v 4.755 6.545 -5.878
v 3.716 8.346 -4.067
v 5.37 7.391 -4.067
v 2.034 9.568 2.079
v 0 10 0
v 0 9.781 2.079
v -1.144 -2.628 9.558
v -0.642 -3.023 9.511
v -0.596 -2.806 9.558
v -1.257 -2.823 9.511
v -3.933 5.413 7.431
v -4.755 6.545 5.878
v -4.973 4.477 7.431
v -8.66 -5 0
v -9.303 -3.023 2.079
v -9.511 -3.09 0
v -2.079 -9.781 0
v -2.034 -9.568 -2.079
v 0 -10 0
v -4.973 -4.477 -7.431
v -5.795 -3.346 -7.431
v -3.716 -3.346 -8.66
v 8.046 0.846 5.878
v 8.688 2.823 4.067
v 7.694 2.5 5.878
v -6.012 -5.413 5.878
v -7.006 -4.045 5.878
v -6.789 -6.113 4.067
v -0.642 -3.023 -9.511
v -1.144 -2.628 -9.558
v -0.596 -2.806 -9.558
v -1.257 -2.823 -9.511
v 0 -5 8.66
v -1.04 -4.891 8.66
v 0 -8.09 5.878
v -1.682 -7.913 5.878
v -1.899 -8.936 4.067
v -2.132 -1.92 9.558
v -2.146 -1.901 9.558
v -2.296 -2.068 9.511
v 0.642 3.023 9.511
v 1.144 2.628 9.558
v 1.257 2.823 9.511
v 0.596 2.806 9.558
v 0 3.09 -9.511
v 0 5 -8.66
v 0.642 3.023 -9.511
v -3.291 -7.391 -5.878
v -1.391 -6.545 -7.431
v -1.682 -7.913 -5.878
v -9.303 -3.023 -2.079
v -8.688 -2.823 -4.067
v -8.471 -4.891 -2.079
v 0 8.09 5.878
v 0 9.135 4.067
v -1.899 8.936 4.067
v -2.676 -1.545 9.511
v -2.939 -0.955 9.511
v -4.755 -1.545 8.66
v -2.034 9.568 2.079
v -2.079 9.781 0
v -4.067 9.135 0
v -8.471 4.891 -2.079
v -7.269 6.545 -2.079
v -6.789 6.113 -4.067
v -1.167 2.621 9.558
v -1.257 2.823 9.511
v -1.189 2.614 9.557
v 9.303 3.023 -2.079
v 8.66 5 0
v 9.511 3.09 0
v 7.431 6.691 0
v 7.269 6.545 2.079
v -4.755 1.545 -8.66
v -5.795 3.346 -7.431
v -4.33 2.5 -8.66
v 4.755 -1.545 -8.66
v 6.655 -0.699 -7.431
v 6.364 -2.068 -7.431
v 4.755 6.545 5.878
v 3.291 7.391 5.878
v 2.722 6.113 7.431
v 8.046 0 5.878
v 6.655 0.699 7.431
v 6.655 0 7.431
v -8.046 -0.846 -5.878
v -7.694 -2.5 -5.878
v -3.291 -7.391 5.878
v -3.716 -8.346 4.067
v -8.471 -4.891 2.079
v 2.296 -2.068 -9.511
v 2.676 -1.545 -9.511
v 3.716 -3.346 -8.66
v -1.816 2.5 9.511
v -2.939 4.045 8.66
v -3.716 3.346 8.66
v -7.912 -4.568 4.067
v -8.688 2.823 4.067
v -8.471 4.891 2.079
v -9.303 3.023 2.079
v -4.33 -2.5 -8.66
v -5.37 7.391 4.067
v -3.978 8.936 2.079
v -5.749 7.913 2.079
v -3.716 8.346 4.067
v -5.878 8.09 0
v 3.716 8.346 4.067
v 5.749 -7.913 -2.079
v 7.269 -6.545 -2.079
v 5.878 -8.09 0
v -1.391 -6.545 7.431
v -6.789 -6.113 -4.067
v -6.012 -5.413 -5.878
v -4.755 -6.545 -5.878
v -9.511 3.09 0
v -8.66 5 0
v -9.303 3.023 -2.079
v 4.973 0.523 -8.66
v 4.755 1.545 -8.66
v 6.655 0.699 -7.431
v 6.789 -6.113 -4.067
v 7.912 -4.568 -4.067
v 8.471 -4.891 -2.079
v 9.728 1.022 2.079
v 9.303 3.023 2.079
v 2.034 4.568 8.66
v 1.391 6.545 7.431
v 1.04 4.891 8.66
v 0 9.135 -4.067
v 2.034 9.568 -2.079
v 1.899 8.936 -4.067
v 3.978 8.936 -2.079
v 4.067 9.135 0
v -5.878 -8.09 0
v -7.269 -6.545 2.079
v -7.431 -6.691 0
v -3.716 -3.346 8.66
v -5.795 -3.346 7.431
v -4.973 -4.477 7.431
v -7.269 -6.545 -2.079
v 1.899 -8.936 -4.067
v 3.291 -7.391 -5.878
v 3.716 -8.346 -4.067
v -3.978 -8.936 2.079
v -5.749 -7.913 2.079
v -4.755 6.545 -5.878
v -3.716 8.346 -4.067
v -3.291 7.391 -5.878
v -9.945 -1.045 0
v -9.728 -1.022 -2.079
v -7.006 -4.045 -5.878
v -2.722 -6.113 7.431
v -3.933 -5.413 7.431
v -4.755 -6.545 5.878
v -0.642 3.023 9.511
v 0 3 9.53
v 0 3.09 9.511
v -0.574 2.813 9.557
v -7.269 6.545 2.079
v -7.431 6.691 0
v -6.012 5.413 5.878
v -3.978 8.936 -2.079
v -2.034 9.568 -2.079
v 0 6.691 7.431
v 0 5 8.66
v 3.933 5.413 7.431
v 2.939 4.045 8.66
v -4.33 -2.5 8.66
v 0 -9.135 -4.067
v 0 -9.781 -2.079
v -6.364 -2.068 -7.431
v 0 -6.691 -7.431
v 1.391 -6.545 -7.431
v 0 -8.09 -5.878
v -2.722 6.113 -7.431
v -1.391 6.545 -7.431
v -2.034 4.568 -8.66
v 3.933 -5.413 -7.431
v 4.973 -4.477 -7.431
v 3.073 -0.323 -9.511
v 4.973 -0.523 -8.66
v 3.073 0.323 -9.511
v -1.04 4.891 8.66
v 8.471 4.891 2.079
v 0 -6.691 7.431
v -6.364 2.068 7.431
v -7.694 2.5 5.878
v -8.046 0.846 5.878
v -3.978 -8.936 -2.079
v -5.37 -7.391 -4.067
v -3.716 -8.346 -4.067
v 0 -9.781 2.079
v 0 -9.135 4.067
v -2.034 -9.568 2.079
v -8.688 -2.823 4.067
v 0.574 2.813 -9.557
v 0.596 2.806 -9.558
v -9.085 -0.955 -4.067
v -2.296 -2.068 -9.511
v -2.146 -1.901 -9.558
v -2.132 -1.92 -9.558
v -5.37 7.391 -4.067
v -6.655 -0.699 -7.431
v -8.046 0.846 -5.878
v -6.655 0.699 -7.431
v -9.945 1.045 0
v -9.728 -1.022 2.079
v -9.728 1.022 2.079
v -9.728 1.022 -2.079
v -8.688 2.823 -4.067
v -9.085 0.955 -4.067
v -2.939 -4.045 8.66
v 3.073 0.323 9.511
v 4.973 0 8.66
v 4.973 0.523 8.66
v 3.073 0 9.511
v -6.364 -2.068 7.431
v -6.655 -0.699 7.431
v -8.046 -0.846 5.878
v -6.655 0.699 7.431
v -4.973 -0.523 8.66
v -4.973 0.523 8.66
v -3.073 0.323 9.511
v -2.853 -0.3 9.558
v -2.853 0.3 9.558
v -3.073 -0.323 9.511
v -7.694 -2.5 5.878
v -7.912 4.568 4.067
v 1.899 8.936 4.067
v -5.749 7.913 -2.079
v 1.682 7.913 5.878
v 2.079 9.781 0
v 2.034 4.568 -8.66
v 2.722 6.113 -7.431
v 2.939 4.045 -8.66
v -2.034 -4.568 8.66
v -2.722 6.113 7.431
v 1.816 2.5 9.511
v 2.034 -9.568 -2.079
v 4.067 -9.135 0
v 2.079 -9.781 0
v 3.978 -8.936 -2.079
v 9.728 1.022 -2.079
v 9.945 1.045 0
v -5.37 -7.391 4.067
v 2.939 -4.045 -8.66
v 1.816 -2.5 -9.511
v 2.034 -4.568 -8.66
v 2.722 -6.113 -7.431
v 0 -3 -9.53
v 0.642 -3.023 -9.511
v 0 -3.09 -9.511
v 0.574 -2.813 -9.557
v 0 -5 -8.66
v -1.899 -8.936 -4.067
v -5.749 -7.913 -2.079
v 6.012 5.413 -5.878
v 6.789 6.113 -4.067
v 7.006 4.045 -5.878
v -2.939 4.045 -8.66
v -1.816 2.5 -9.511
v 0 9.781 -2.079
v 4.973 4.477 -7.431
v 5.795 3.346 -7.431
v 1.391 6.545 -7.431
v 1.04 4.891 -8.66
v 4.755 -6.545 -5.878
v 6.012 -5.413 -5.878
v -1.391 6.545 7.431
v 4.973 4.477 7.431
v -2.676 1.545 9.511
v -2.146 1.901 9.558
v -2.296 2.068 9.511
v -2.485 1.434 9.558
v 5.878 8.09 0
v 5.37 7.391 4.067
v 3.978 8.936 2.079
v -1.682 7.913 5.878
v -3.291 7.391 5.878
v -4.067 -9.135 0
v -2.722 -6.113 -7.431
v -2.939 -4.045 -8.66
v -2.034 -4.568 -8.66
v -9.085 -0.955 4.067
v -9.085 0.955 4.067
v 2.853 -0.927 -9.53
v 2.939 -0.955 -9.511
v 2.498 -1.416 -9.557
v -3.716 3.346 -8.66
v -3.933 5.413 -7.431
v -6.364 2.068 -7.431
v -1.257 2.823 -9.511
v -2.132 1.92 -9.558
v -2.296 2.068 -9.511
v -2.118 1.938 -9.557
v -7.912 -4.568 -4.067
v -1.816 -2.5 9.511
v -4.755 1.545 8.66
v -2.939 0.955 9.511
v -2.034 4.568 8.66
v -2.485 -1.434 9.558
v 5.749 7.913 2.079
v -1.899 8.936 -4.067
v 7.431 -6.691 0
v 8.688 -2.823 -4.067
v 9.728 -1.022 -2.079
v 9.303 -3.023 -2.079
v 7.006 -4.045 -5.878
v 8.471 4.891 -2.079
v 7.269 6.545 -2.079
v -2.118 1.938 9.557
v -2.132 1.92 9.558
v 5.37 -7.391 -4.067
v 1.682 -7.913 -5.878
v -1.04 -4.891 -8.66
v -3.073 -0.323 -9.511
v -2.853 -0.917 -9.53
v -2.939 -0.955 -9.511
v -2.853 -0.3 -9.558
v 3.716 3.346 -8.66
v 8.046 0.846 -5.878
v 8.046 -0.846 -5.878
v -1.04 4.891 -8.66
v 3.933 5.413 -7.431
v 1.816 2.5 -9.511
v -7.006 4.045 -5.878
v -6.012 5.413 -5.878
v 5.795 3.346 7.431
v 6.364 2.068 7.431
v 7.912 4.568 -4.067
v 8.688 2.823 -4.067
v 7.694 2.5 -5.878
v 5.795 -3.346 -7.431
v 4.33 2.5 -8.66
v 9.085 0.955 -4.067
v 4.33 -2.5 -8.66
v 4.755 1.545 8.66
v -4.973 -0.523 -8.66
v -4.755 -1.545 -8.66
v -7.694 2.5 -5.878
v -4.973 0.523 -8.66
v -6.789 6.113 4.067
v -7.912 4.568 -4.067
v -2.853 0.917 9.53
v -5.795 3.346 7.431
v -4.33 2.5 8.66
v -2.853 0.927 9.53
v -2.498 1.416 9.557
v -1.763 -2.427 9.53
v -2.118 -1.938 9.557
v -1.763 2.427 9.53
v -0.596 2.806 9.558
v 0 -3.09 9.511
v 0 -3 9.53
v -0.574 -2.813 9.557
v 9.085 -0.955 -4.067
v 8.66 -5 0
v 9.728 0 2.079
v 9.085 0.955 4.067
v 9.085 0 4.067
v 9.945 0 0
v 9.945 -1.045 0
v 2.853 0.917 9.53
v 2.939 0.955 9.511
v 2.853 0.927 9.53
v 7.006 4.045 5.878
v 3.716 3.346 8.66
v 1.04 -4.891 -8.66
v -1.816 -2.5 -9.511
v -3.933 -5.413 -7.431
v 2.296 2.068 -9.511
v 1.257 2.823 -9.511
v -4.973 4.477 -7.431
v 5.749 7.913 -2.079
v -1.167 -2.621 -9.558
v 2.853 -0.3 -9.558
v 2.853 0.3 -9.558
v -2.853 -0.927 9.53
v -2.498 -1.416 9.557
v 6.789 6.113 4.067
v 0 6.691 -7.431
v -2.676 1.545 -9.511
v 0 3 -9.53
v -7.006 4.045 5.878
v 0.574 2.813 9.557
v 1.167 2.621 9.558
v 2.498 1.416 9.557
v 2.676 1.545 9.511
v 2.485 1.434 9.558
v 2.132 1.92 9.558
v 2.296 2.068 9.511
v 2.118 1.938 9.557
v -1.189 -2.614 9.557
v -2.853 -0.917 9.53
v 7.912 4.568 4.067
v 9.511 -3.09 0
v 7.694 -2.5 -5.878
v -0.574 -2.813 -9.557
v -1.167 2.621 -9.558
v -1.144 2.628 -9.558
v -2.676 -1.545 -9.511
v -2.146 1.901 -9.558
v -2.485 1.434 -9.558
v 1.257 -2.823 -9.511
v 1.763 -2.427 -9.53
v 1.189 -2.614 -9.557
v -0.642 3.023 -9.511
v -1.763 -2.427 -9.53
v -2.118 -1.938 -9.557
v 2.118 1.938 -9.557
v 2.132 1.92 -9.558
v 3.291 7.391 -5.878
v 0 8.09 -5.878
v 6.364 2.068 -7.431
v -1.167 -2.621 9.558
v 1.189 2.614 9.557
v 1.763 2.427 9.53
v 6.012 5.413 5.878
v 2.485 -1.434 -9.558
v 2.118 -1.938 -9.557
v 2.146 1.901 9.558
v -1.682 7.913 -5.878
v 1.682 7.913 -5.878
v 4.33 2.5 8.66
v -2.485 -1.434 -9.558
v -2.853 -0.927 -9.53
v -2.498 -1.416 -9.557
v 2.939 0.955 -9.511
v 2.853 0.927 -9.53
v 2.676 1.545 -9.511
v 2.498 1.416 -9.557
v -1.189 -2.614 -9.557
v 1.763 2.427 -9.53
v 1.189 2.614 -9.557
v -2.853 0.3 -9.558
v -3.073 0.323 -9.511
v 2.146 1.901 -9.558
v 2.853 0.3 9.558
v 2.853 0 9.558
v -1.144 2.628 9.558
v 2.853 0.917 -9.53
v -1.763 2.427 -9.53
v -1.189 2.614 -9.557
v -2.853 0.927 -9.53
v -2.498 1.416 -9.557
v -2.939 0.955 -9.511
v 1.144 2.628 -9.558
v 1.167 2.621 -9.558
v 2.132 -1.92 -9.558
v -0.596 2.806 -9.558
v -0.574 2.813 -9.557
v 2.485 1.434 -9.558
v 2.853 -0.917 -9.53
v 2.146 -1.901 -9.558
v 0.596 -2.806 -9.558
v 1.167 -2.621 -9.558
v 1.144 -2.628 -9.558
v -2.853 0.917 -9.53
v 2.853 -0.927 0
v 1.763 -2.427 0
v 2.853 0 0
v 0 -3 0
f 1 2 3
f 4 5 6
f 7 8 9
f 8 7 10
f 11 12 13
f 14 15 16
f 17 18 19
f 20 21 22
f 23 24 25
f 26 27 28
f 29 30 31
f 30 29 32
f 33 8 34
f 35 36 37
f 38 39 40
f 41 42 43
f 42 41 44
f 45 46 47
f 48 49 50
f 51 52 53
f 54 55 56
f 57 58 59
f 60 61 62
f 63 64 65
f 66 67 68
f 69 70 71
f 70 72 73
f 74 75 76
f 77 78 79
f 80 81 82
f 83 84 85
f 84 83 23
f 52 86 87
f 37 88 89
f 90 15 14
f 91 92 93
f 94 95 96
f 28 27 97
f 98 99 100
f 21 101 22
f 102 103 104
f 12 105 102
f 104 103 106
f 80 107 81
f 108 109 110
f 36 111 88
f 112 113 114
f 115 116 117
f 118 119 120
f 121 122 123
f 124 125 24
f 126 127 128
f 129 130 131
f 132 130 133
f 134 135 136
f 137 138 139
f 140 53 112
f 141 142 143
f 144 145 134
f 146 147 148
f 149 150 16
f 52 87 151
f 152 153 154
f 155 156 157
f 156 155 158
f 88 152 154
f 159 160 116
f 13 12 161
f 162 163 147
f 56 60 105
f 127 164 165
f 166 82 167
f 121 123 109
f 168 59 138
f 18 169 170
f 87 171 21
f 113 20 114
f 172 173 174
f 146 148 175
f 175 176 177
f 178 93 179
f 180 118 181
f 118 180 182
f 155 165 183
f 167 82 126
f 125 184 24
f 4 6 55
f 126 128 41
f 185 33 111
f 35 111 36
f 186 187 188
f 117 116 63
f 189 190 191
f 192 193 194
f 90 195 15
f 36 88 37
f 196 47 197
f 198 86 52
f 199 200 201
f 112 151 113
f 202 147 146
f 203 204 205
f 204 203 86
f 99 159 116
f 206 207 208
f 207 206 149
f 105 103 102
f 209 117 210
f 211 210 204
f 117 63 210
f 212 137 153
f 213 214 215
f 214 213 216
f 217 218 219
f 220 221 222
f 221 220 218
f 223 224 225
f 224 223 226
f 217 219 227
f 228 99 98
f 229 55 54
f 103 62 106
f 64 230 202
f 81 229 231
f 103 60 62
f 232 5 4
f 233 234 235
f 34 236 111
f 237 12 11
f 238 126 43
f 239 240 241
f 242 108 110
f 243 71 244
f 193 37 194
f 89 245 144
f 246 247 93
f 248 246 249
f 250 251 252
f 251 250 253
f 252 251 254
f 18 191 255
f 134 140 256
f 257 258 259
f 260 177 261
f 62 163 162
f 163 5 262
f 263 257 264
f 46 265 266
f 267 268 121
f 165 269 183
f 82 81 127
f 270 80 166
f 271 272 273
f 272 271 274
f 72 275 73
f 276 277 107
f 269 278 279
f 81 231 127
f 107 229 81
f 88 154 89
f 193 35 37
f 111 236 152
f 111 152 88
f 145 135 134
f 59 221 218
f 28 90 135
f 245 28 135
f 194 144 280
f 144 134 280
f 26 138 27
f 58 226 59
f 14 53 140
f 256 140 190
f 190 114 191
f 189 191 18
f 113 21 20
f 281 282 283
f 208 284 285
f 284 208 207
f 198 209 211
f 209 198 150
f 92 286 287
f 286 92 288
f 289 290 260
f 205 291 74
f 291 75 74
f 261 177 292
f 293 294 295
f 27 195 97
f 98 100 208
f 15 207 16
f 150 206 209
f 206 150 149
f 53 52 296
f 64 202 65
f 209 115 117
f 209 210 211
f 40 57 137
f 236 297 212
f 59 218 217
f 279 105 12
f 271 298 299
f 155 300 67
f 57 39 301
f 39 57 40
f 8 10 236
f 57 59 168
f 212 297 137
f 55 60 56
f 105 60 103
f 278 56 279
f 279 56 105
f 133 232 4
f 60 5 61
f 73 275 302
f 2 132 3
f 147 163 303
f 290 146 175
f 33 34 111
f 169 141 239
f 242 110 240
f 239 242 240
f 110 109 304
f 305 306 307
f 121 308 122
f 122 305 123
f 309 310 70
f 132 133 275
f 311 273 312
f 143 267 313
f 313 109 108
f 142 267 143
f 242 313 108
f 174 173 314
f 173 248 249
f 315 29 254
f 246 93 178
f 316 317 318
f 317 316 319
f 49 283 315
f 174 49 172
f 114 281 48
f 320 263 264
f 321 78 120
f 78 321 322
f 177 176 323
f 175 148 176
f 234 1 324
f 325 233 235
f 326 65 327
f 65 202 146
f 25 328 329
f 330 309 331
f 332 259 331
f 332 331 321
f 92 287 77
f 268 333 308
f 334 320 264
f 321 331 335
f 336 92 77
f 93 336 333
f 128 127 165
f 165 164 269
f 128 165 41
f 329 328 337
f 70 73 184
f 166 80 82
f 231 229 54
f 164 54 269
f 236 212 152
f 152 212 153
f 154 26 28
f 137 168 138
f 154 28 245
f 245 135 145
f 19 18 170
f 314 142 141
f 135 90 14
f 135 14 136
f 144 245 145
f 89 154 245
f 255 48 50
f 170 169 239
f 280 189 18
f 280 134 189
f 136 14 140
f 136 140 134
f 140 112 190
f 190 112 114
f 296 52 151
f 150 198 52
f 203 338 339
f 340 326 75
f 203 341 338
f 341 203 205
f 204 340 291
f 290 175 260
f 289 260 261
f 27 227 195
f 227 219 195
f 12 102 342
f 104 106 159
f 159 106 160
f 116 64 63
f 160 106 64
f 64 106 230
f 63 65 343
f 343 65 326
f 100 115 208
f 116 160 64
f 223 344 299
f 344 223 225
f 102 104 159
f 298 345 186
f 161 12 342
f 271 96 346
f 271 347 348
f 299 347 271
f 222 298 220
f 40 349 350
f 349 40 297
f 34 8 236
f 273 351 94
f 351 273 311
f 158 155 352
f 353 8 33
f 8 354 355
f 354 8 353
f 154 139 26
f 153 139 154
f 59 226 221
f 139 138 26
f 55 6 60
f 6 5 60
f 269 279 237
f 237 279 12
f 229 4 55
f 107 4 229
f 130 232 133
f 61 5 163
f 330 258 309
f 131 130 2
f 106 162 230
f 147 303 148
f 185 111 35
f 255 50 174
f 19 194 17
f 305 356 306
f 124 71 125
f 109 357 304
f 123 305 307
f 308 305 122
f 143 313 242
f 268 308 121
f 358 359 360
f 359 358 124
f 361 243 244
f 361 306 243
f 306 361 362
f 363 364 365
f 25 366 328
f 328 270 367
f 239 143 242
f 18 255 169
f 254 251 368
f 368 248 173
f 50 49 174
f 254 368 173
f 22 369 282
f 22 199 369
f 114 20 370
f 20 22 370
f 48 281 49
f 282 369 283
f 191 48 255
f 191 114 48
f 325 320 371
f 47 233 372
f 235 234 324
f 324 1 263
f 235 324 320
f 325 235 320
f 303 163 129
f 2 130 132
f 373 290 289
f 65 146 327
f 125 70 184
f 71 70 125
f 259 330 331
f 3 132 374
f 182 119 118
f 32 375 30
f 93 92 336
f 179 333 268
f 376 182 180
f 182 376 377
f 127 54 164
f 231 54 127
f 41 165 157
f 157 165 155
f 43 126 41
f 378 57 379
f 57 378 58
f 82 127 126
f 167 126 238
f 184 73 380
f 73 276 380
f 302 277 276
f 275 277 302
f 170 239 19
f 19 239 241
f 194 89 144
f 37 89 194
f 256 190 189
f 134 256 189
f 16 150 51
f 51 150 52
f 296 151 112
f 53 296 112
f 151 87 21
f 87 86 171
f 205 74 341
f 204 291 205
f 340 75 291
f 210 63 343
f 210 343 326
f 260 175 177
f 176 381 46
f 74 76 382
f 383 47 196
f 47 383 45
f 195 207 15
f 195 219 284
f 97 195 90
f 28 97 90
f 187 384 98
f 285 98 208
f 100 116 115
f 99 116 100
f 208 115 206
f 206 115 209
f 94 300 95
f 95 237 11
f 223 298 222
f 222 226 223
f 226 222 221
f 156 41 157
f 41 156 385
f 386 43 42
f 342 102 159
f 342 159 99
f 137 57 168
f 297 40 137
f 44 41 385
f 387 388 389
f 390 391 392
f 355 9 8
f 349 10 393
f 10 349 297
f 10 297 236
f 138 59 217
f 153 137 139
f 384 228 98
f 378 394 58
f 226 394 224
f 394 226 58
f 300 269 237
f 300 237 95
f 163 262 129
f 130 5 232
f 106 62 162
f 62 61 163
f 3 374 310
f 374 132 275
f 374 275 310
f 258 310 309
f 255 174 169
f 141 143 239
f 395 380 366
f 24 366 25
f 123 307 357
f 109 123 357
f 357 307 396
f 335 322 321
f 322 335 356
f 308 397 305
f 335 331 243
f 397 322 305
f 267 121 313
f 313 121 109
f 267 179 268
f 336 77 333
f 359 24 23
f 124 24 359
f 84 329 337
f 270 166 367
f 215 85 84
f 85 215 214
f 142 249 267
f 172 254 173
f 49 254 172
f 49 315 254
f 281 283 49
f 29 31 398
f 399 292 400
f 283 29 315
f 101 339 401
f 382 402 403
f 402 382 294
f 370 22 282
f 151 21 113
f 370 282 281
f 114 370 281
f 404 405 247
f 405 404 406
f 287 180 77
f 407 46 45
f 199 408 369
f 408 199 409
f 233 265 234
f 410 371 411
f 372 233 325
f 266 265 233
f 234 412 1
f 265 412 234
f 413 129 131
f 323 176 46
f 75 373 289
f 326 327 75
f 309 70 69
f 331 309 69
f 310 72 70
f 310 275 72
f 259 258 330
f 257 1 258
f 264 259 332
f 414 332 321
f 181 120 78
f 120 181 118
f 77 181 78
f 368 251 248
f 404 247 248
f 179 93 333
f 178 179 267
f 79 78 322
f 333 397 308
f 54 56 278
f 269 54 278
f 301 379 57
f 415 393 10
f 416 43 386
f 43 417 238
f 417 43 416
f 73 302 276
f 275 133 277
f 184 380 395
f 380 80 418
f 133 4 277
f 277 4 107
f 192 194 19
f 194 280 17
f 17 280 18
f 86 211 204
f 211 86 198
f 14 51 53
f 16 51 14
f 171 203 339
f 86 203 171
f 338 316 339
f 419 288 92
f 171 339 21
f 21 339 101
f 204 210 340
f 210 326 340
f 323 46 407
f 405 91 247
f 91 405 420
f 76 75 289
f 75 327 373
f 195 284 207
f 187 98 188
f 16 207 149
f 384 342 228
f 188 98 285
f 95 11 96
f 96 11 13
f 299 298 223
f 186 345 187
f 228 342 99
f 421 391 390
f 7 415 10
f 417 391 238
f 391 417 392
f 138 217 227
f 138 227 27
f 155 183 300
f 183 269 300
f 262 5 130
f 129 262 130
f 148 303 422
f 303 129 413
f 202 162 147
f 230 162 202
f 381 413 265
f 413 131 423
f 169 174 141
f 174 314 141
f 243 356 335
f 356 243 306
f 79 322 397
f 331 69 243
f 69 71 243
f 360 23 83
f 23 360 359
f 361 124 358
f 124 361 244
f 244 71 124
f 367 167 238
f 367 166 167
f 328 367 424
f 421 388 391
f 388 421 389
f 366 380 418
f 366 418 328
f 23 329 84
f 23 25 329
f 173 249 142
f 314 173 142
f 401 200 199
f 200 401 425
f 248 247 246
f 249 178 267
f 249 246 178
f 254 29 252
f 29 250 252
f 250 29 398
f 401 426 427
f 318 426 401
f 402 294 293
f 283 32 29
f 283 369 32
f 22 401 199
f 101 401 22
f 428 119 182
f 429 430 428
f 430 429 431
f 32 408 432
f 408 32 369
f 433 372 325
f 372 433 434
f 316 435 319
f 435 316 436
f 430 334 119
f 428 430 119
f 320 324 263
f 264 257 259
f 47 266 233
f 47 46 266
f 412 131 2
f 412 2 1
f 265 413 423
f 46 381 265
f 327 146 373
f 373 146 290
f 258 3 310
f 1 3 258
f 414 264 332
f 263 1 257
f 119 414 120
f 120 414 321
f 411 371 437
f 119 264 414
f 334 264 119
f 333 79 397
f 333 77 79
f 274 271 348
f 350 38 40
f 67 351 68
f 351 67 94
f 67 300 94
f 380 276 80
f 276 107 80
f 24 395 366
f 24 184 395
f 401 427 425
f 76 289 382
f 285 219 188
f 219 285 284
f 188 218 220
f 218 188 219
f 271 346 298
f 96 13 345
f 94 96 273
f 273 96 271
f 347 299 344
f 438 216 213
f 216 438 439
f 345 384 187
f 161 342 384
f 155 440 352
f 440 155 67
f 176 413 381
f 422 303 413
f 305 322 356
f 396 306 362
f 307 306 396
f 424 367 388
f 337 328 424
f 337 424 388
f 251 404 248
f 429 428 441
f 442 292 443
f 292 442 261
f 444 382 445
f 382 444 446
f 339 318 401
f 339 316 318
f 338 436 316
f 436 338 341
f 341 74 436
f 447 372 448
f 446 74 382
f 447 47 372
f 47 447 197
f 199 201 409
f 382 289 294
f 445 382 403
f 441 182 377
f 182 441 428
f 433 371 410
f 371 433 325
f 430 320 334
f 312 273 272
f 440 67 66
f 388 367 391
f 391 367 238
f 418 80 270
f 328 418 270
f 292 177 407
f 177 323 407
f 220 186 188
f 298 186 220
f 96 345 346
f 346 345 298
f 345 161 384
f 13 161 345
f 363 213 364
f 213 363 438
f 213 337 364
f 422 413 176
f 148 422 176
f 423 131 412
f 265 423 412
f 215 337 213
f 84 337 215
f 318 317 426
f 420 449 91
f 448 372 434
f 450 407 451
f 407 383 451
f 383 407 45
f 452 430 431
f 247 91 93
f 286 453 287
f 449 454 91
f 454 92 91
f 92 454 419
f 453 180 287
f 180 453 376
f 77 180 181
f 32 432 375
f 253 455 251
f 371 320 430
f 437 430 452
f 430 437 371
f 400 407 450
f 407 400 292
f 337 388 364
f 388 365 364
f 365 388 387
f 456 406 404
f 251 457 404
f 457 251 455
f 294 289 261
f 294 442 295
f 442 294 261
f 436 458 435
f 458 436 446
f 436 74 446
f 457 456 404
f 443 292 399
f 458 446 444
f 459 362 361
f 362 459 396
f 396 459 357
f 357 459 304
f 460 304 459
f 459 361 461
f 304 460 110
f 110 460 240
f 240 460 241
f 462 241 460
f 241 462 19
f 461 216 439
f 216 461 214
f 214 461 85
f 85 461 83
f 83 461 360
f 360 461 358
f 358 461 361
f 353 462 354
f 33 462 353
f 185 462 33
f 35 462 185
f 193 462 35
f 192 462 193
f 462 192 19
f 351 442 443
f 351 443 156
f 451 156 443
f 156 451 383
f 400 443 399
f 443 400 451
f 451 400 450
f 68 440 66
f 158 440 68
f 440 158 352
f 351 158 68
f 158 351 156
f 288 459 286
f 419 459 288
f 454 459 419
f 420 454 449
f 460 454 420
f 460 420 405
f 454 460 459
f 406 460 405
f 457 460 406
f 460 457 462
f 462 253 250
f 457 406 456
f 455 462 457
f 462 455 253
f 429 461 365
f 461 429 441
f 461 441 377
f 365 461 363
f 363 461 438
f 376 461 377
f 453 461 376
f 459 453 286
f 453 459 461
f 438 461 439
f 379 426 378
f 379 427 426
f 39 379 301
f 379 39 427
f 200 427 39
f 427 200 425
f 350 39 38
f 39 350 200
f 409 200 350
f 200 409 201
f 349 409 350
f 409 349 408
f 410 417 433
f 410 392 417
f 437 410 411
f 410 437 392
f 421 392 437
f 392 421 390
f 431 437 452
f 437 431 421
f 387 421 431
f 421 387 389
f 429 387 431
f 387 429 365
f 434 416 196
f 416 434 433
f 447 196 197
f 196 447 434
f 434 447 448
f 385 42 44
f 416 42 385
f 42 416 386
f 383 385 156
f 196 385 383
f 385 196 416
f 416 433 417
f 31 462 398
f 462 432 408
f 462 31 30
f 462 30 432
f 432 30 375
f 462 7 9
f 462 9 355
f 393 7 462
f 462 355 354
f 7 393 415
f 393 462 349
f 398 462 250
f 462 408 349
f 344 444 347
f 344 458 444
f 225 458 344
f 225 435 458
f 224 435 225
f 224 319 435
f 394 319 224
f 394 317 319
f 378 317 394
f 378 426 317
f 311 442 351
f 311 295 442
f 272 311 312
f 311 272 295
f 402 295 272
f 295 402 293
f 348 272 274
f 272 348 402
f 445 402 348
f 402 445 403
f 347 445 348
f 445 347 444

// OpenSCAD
// Volume: 3147.674757387944, SurfaceArea: 1521.5706624387103
// https://github.com/openscad/openscad/pull/5185#issuecomment-2183769802
rotate([0, 0, -90]) 
  difference() {
    color("yellow")
      render()
        difference() {
          color("red") sphere(10);
          color("blue") cube(10);
        }
    color("green")
      cylinder(r=3, h=20, center=true);
  }
